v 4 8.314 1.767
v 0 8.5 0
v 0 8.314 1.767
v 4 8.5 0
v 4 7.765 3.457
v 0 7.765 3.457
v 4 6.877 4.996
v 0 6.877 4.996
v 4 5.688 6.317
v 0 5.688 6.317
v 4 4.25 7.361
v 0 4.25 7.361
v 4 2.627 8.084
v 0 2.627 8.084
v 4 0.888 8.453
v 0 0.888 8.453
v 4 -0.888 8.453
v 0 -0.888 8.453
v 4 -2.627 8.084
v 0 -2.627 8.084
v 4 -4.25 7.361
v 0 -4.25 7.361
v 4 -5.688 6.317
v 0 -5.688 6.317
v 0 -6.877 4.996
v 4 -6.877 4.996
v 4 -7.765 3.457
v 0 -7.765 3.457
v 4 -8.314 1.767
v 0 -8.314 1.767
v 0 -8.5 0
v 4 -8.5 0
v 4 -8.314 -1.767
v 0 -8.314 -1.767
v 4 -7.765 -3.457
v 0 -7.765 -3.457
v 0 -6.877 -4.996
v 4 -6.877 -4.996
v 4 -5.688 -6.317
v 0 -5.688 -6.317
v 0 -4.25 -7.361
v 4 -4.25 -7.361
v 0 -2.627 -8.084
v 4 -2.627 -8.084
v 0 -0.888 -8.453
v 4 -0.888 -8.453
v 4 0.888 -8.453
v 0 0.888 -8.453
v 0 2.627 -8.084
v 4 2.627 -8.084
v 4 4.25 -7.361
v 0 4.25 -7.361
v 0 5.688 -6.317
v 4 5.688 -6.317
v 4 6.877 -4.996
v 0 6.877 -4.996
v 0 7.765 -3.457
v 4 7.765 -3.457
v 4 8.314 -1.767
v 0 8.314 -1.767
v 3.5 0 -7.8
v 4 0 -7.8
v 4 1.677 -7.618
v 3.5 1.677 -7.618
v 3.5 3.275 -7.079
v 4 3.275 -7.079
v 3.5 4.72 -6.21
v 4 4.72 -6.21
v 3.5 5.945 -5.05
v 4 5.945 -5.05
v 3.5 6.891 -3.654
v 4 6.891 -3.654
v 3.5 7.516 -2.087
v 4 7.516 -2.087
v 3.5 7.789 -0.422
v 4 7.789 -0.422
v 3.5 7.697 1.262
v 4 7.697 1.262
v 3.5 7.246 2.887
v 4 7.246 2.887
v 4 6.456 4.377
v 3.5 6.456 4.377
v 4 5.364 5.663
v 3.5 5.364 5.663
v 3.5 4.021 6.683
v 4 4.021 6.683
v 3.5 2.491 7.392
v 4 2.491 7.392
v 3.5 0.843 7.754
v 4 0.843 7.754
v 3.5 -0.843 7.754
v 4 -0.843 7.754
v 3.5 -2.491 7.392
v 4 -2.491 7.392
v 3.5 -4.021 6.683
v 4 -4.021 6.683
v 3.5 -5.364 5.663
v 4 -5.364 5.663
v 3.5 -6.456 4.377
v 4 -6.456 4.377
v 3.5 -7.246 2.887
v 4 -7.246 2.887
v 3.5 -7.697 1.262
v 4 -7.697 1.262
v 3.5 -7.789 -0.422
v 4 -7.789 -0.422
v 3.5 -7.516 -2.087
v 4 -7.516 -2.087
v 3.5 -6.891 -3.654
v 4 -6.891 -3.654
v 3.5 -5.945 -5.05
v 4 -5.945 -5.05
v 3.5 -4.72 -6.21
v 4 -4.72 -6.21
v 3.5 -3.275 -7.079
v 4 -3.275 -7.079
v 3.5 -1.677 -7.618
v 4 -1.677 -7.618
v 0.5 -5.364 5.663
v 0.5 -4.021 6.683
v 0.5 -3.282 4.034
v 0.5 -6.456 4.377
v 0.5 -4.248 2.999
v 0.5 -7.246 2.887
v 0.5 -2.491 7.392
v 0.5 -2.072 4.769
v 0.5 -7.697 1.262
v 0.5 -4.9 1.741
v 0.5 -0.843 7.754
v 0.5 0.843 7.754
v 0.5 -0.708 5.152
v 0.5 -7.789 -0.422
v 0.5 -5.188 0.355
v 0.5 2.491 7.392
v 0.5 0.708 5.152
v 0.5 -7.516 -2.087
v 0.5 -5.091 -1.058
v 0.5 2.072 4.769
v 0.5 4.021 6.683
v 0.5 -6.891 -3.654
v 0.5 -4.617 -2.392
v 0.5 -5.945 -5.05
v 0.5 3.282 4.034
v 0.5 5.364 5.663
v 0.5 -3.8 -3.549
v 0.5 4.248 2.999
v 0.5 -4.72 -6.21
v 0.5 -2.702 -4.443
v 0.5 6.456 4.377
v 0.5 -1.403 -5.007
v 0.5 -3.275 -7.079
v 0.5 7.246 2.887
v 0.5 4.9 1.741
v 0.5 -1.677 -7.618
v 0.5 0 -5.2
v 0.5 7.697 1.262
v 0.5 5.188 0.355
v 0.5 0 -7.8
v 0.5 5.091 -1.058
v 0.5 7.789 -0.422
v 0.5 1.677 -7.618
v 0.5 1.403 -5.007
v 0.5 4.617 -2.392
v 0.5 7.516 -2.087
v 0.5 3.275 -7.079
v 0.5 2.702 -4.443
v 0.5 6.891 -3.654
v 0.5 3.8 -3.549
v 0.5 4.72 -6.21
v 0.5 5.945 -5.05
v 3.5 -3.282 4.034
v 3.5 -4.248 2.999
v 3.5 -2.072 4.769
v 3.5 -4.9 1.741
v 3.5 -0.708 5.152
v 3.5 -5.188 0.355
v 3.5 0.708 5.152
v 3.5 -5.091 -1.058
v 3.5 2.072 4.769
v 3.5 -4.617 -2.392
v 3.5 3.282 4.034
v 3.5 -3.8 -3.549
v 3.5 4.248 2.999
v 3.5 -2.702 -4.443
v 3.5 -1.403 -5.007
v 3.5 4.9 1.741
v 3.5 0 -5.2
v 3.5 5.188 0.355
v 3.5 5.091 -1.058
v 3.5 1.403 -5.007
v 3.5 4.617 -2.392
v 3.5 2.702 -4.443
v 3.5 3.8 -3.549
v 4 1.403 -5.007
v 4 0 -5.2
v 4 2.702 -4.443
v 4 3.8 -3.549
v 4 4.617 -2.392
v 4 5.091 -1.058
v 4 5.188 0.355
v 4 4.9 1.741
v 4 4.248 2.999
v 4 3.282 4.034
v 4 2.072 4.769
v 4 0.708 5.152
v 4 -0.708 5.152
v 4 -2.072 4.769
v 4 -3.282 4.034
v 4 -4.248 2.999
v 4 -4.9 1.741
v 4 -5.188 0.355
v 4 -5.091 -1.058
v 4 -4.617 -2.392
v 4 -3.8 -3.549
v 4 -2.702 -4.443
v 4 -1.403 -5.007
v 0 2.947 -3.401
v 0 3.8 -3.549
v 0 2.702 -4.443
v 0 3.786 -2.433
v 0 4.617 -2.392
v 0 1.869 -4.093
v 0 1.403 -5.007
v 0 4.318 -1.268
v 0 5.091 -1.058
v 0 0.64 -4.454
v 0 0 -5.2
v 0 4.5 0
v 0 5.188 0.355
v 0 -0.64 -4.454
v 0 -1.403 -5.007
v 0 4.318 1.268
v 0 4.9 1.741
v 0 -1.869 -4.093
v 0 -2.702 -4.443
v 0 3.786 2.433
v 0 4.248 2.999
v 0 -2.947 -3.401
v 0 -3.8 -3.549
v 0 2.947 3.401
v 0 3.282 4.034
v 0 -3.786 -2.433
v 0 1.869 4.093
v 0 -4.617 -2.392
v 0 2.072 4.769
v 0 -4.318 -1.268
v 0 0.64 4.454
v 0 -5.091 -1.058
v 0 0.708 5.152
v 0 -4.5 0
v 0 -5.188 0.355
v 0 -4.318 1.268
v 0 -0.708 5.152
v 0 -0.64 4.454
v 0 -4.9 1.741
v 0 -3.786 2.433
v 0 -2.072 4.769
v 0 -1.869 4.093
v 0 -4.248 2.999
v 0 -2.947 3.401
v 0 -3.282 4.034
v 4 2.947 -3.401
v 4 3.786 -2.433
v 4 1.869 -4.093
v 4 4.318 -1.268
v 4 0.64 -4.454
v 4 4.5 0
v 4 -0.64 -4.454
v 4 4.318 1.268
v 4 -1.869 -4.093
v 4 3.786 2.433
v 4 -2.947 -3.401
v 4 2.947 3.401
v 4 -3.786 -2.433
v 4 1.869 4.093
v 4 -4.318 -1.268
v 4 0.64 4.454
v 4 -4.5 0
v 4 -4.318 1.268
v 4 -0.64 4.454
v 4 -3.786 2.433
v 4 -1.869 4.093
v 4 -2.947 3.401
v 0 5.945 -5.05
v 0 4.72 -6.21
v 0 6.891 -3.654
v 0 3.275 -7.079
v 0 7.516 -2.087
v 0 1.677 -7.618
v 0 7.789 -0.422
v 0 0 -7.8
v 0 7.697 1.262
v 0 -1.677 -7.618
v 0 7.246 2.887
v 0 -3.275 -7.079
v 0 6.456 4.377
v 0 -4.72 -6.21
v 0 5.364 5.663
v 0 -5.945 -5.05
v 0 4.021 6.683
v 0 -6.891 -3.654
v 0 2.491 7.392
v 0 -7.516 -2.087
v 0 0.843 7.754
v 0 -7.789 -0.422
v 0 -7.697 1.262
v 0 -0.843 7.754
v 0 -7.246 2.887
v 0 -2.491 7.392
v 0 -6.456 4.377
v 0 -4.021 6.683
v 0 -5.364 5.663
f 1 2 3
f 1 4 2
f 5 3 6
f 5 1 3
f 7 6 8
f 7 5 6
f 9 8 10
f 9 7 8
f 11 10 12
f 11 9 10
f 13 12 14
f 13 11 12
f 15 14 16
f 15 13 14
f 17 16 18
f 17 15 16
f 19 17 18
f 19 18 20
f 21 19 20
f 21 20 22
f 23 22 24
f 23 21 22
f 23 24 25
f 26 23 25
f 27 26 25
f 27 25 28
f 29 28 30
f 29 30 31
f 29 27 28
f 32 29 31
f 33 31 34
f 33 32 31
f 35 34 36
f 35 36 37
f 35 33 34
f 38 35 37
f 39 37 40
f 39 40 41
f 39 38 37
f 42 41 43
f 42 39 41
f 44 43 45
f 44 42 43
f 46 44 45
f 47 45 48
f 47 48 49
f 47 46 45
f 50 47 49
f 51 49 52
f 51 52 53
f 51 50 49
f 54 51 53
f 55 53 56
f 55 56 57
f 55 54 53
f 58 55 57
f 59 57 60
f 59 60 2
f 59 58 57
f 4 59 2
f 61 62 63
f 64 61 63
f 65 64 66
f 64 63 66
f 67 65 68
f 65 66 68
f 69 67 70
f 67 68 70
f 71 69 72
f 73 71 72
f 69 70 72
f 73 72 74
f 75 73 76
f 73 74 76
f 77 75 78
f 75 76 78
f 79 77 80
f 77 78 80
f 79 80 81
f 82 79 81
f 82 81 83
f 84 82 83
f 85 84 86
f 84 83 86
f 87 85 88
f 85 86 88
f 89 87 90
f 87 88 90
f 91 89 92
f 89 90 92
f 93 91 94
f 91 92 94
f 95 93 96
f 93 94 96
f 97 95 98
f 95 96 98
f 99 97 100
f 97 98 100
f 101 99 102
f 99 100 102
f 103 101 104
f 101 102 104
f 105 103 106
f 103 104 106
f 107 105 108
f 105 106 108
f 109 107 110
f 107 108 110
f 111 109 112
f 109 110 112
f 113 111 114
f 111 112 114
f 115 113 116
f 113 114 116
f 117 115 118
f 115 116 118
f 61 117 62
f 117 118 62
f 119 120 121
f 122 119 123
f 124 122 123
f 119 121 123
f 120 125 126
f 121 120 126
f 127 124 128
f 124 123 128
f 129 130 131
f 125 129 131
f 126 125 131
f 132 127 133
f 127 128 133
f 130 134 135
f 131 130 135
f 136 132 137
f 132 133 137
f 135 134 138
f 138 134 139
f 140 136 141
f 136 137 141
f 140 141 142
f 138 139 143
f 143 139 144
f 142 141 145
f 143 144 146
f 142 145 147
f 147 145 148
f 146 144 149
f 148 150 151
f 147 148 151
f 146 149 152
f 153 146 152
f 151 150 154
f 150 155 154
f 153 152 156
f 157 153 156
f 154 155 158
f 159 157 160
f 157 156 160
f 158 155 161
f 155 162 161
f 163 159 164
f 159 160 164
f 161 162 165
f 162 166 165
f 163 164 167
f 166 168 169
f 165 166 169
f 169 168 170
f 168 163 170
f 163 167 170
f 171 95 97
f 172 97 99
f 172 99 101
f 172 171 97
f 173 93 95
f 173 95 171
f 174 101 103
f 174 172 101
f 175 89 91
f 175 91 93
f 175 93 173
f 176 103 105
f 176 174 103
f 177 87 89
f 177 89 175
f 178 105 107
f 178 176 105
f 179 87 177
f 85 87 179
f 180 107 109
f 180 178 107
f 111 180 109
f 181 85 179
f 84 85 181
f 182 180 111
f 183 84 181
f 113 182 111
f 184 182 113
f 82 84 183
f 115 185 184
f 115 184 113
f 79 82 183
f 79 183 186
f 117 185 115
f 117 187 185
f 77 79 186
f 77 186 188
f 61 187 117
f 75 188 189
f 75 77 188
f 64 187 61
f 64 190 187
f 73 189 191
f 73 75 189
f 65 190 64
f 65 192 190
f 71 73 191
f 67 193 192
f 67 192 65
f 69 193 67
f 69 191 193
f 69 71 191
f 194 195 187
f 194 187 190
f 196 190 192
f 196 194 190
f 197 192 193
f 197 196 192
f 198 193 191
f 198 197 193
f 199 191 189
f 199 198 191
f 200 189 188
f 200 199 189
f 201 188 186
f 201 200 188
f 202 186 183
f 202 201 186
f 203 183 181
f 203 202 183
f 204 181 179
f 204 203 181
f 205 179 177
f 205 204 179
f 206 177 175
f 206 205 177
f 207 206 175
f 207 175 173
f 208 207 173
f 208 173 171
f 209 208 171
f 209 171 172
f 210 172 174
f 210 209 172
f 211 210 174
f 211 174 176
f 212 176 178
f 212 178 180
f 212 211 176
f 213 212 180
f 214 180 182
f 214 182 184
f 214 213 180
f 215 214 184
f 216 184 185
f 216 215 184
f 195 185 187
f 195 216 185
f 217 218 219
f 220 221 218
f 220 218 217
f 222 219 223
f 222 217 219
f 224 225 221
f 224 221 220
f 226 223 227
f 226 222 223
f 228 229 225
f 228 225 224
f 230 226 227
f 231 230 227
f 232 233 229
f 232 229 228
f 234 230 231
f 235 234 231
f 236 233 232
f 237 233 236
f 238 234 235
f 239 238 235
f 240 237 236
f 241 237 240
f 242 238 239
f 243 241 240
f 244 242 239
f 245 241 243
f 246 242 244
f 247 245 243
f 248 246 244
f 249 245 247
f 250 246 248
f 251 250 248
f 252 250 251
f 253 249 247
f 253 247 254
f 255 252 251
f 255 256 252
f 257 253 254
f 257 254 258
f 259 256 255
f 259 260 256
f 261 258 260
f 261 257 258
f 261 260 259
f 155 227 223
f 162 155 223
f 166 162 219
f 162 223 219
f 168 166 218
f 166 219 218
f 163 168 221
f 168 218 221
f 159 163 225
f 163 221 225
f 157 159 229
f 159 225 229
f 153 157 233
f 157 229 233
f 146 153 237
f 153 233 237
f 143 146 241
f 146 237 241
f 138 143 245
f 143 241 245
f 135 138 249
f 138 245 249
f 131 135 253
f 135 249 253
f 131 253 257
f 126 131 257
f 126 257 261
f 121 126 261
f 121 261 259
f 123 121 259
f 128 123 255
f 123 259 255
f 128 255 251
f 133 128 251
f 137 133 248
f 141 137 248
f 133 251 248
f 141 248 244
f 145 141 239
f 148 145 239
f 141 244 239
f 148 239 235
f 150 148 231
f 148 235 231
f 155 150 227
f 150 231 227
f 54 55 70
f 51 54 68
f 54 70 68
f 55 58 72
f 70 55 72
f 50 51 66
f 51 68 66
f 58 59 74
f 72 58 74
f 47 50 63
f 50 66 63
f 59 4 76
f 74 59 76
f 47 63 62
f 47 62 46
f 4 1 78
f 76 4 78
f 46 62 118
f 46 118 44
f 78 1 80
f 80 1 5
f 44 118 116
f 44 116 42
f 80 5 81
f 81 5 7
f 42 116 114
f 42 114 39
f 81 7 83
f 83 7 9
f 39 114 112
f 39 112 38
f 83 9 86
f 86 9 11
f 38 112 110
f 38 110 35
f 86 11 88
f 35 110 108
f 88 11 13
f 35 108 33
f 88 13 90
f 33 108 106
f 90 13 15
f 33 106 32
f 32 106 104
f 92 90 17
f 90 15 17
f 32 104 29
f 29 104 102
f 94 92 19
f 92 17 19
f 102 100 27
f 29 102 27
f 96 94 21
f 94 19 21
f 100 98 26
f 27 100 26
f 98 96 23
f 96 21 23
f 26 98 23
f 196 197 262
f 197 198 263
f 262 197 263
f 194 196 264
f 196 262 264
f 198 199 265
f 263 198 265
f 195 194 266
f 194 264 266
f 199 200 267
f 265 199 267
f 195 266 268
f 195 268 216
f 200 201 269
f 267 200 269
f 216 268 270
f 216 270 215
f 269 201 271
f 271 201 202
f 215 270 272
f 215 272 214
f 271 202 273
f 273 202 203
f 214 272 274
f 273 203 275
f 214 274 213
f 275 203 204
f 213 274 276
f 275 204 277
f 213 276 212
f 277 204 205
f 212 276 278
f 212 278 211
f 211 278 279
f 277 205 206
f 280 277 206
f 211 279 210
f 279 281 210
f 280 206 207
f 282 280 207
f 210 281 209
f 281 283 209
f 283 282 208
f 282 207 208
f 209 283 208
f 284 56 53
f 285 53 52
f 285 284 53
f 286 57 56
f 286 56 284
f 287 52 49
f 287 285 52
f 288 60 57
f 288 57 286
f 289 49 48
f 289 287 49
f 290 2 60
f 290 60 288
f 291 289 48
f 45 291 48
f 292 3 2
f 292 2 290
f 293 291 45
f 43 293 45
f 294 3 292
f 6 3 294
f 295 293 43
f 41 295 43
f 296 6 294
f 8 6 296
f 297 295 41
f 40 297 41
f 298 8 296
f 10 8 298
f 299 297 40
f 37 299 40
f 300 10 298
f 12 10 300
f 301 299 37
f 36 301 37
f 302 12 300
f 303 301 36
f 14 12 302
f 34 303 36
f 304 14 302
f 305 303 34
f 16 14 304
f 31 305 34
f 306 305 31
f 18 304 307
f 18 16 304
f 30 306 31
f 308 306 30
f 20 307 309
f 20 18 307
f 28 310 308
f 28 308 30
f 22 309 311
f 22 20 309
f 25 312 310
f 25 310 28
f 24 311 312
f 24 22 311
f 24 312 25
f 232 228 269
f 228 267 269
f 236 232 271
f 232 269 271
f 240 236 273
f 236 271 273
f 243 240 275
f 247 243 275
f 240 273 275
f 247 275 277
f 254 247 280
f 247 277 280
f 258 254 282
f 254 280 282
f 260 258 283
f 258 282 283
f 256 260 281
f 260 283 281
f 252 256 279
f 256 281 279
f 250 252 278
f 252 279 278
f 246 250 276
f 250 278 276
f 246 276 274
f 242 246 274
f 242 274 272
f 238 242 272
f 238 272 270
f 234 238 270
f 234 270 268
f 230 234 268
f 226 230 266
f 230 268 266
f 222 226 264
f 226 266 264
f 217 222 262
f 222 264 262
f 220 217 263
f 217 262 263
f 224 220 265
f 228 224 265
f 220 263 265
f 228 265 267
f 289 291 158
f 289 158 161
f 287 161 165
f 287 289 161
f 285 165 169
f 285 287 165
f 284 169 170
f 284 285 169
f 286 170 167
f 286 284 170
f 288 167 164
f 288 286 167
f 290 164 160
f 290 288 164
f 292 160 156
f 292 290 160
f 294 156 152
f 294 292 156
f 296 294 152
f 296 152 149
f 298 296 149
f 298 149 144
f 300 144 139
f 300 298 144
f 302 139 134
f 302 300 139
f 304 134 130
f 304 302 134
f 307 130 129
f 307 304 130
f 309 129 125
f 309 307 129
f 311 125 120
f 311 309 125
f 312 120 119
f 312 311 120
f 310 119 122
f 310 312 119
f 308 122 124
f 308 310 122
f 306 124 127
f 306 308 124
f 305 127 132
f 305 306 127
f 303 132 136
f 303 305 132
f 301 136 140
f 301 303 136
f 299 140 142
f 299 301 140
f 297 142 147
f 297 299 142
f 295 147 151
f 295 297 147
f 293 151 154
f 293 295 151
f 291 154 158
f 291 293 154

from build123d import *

# Parameters (mm, degrees)
CROQUIS1_W            = 4
CROQUIS1_H            = 4
CROQUIS2_R            = 7.8
CROQUIS2_R_2          = 5.2
CORTAR_EXTRUIR1_DEPTH = 0.5


with BuildPart() as part:
    # Croquis1 → Revolución1 (revolve)
    with BuildSketch(Plane.XY):
        with Locations((2, 6.5)):
            Rectangle(CROQUIS1_W, CROQUIS1_H)
    revolve(axis=Axis((0, 0, 0), (1, 0, 0)))

    # Croquis2 → Cortar-Extruir1 (cut)
    with BuildSketch(Plane(origin=(4, 0, 0), x_dir=(0, 0, -1), z_dir=(1, 0, 0))):
        Circle(CROQUIS2_R)
        Circle(CROQUIS2_R_2, mode=Mode.SUBTRACT)
    cortar_extruir1 = extrude(amount=-CORTAR_EXTRUIR1_DEPTH, mode=Mode.SUBTRACT)

    # Simetría1: Cortar-Extruir1 across plane
    add(cortar_extruir1.mirror(Plane(origin=(2, 0, 0), x_dir=(0, 0, 1), z_dir=(1, 0, 0))), mode=Mode.SUBTRACT)


solid = part.part
